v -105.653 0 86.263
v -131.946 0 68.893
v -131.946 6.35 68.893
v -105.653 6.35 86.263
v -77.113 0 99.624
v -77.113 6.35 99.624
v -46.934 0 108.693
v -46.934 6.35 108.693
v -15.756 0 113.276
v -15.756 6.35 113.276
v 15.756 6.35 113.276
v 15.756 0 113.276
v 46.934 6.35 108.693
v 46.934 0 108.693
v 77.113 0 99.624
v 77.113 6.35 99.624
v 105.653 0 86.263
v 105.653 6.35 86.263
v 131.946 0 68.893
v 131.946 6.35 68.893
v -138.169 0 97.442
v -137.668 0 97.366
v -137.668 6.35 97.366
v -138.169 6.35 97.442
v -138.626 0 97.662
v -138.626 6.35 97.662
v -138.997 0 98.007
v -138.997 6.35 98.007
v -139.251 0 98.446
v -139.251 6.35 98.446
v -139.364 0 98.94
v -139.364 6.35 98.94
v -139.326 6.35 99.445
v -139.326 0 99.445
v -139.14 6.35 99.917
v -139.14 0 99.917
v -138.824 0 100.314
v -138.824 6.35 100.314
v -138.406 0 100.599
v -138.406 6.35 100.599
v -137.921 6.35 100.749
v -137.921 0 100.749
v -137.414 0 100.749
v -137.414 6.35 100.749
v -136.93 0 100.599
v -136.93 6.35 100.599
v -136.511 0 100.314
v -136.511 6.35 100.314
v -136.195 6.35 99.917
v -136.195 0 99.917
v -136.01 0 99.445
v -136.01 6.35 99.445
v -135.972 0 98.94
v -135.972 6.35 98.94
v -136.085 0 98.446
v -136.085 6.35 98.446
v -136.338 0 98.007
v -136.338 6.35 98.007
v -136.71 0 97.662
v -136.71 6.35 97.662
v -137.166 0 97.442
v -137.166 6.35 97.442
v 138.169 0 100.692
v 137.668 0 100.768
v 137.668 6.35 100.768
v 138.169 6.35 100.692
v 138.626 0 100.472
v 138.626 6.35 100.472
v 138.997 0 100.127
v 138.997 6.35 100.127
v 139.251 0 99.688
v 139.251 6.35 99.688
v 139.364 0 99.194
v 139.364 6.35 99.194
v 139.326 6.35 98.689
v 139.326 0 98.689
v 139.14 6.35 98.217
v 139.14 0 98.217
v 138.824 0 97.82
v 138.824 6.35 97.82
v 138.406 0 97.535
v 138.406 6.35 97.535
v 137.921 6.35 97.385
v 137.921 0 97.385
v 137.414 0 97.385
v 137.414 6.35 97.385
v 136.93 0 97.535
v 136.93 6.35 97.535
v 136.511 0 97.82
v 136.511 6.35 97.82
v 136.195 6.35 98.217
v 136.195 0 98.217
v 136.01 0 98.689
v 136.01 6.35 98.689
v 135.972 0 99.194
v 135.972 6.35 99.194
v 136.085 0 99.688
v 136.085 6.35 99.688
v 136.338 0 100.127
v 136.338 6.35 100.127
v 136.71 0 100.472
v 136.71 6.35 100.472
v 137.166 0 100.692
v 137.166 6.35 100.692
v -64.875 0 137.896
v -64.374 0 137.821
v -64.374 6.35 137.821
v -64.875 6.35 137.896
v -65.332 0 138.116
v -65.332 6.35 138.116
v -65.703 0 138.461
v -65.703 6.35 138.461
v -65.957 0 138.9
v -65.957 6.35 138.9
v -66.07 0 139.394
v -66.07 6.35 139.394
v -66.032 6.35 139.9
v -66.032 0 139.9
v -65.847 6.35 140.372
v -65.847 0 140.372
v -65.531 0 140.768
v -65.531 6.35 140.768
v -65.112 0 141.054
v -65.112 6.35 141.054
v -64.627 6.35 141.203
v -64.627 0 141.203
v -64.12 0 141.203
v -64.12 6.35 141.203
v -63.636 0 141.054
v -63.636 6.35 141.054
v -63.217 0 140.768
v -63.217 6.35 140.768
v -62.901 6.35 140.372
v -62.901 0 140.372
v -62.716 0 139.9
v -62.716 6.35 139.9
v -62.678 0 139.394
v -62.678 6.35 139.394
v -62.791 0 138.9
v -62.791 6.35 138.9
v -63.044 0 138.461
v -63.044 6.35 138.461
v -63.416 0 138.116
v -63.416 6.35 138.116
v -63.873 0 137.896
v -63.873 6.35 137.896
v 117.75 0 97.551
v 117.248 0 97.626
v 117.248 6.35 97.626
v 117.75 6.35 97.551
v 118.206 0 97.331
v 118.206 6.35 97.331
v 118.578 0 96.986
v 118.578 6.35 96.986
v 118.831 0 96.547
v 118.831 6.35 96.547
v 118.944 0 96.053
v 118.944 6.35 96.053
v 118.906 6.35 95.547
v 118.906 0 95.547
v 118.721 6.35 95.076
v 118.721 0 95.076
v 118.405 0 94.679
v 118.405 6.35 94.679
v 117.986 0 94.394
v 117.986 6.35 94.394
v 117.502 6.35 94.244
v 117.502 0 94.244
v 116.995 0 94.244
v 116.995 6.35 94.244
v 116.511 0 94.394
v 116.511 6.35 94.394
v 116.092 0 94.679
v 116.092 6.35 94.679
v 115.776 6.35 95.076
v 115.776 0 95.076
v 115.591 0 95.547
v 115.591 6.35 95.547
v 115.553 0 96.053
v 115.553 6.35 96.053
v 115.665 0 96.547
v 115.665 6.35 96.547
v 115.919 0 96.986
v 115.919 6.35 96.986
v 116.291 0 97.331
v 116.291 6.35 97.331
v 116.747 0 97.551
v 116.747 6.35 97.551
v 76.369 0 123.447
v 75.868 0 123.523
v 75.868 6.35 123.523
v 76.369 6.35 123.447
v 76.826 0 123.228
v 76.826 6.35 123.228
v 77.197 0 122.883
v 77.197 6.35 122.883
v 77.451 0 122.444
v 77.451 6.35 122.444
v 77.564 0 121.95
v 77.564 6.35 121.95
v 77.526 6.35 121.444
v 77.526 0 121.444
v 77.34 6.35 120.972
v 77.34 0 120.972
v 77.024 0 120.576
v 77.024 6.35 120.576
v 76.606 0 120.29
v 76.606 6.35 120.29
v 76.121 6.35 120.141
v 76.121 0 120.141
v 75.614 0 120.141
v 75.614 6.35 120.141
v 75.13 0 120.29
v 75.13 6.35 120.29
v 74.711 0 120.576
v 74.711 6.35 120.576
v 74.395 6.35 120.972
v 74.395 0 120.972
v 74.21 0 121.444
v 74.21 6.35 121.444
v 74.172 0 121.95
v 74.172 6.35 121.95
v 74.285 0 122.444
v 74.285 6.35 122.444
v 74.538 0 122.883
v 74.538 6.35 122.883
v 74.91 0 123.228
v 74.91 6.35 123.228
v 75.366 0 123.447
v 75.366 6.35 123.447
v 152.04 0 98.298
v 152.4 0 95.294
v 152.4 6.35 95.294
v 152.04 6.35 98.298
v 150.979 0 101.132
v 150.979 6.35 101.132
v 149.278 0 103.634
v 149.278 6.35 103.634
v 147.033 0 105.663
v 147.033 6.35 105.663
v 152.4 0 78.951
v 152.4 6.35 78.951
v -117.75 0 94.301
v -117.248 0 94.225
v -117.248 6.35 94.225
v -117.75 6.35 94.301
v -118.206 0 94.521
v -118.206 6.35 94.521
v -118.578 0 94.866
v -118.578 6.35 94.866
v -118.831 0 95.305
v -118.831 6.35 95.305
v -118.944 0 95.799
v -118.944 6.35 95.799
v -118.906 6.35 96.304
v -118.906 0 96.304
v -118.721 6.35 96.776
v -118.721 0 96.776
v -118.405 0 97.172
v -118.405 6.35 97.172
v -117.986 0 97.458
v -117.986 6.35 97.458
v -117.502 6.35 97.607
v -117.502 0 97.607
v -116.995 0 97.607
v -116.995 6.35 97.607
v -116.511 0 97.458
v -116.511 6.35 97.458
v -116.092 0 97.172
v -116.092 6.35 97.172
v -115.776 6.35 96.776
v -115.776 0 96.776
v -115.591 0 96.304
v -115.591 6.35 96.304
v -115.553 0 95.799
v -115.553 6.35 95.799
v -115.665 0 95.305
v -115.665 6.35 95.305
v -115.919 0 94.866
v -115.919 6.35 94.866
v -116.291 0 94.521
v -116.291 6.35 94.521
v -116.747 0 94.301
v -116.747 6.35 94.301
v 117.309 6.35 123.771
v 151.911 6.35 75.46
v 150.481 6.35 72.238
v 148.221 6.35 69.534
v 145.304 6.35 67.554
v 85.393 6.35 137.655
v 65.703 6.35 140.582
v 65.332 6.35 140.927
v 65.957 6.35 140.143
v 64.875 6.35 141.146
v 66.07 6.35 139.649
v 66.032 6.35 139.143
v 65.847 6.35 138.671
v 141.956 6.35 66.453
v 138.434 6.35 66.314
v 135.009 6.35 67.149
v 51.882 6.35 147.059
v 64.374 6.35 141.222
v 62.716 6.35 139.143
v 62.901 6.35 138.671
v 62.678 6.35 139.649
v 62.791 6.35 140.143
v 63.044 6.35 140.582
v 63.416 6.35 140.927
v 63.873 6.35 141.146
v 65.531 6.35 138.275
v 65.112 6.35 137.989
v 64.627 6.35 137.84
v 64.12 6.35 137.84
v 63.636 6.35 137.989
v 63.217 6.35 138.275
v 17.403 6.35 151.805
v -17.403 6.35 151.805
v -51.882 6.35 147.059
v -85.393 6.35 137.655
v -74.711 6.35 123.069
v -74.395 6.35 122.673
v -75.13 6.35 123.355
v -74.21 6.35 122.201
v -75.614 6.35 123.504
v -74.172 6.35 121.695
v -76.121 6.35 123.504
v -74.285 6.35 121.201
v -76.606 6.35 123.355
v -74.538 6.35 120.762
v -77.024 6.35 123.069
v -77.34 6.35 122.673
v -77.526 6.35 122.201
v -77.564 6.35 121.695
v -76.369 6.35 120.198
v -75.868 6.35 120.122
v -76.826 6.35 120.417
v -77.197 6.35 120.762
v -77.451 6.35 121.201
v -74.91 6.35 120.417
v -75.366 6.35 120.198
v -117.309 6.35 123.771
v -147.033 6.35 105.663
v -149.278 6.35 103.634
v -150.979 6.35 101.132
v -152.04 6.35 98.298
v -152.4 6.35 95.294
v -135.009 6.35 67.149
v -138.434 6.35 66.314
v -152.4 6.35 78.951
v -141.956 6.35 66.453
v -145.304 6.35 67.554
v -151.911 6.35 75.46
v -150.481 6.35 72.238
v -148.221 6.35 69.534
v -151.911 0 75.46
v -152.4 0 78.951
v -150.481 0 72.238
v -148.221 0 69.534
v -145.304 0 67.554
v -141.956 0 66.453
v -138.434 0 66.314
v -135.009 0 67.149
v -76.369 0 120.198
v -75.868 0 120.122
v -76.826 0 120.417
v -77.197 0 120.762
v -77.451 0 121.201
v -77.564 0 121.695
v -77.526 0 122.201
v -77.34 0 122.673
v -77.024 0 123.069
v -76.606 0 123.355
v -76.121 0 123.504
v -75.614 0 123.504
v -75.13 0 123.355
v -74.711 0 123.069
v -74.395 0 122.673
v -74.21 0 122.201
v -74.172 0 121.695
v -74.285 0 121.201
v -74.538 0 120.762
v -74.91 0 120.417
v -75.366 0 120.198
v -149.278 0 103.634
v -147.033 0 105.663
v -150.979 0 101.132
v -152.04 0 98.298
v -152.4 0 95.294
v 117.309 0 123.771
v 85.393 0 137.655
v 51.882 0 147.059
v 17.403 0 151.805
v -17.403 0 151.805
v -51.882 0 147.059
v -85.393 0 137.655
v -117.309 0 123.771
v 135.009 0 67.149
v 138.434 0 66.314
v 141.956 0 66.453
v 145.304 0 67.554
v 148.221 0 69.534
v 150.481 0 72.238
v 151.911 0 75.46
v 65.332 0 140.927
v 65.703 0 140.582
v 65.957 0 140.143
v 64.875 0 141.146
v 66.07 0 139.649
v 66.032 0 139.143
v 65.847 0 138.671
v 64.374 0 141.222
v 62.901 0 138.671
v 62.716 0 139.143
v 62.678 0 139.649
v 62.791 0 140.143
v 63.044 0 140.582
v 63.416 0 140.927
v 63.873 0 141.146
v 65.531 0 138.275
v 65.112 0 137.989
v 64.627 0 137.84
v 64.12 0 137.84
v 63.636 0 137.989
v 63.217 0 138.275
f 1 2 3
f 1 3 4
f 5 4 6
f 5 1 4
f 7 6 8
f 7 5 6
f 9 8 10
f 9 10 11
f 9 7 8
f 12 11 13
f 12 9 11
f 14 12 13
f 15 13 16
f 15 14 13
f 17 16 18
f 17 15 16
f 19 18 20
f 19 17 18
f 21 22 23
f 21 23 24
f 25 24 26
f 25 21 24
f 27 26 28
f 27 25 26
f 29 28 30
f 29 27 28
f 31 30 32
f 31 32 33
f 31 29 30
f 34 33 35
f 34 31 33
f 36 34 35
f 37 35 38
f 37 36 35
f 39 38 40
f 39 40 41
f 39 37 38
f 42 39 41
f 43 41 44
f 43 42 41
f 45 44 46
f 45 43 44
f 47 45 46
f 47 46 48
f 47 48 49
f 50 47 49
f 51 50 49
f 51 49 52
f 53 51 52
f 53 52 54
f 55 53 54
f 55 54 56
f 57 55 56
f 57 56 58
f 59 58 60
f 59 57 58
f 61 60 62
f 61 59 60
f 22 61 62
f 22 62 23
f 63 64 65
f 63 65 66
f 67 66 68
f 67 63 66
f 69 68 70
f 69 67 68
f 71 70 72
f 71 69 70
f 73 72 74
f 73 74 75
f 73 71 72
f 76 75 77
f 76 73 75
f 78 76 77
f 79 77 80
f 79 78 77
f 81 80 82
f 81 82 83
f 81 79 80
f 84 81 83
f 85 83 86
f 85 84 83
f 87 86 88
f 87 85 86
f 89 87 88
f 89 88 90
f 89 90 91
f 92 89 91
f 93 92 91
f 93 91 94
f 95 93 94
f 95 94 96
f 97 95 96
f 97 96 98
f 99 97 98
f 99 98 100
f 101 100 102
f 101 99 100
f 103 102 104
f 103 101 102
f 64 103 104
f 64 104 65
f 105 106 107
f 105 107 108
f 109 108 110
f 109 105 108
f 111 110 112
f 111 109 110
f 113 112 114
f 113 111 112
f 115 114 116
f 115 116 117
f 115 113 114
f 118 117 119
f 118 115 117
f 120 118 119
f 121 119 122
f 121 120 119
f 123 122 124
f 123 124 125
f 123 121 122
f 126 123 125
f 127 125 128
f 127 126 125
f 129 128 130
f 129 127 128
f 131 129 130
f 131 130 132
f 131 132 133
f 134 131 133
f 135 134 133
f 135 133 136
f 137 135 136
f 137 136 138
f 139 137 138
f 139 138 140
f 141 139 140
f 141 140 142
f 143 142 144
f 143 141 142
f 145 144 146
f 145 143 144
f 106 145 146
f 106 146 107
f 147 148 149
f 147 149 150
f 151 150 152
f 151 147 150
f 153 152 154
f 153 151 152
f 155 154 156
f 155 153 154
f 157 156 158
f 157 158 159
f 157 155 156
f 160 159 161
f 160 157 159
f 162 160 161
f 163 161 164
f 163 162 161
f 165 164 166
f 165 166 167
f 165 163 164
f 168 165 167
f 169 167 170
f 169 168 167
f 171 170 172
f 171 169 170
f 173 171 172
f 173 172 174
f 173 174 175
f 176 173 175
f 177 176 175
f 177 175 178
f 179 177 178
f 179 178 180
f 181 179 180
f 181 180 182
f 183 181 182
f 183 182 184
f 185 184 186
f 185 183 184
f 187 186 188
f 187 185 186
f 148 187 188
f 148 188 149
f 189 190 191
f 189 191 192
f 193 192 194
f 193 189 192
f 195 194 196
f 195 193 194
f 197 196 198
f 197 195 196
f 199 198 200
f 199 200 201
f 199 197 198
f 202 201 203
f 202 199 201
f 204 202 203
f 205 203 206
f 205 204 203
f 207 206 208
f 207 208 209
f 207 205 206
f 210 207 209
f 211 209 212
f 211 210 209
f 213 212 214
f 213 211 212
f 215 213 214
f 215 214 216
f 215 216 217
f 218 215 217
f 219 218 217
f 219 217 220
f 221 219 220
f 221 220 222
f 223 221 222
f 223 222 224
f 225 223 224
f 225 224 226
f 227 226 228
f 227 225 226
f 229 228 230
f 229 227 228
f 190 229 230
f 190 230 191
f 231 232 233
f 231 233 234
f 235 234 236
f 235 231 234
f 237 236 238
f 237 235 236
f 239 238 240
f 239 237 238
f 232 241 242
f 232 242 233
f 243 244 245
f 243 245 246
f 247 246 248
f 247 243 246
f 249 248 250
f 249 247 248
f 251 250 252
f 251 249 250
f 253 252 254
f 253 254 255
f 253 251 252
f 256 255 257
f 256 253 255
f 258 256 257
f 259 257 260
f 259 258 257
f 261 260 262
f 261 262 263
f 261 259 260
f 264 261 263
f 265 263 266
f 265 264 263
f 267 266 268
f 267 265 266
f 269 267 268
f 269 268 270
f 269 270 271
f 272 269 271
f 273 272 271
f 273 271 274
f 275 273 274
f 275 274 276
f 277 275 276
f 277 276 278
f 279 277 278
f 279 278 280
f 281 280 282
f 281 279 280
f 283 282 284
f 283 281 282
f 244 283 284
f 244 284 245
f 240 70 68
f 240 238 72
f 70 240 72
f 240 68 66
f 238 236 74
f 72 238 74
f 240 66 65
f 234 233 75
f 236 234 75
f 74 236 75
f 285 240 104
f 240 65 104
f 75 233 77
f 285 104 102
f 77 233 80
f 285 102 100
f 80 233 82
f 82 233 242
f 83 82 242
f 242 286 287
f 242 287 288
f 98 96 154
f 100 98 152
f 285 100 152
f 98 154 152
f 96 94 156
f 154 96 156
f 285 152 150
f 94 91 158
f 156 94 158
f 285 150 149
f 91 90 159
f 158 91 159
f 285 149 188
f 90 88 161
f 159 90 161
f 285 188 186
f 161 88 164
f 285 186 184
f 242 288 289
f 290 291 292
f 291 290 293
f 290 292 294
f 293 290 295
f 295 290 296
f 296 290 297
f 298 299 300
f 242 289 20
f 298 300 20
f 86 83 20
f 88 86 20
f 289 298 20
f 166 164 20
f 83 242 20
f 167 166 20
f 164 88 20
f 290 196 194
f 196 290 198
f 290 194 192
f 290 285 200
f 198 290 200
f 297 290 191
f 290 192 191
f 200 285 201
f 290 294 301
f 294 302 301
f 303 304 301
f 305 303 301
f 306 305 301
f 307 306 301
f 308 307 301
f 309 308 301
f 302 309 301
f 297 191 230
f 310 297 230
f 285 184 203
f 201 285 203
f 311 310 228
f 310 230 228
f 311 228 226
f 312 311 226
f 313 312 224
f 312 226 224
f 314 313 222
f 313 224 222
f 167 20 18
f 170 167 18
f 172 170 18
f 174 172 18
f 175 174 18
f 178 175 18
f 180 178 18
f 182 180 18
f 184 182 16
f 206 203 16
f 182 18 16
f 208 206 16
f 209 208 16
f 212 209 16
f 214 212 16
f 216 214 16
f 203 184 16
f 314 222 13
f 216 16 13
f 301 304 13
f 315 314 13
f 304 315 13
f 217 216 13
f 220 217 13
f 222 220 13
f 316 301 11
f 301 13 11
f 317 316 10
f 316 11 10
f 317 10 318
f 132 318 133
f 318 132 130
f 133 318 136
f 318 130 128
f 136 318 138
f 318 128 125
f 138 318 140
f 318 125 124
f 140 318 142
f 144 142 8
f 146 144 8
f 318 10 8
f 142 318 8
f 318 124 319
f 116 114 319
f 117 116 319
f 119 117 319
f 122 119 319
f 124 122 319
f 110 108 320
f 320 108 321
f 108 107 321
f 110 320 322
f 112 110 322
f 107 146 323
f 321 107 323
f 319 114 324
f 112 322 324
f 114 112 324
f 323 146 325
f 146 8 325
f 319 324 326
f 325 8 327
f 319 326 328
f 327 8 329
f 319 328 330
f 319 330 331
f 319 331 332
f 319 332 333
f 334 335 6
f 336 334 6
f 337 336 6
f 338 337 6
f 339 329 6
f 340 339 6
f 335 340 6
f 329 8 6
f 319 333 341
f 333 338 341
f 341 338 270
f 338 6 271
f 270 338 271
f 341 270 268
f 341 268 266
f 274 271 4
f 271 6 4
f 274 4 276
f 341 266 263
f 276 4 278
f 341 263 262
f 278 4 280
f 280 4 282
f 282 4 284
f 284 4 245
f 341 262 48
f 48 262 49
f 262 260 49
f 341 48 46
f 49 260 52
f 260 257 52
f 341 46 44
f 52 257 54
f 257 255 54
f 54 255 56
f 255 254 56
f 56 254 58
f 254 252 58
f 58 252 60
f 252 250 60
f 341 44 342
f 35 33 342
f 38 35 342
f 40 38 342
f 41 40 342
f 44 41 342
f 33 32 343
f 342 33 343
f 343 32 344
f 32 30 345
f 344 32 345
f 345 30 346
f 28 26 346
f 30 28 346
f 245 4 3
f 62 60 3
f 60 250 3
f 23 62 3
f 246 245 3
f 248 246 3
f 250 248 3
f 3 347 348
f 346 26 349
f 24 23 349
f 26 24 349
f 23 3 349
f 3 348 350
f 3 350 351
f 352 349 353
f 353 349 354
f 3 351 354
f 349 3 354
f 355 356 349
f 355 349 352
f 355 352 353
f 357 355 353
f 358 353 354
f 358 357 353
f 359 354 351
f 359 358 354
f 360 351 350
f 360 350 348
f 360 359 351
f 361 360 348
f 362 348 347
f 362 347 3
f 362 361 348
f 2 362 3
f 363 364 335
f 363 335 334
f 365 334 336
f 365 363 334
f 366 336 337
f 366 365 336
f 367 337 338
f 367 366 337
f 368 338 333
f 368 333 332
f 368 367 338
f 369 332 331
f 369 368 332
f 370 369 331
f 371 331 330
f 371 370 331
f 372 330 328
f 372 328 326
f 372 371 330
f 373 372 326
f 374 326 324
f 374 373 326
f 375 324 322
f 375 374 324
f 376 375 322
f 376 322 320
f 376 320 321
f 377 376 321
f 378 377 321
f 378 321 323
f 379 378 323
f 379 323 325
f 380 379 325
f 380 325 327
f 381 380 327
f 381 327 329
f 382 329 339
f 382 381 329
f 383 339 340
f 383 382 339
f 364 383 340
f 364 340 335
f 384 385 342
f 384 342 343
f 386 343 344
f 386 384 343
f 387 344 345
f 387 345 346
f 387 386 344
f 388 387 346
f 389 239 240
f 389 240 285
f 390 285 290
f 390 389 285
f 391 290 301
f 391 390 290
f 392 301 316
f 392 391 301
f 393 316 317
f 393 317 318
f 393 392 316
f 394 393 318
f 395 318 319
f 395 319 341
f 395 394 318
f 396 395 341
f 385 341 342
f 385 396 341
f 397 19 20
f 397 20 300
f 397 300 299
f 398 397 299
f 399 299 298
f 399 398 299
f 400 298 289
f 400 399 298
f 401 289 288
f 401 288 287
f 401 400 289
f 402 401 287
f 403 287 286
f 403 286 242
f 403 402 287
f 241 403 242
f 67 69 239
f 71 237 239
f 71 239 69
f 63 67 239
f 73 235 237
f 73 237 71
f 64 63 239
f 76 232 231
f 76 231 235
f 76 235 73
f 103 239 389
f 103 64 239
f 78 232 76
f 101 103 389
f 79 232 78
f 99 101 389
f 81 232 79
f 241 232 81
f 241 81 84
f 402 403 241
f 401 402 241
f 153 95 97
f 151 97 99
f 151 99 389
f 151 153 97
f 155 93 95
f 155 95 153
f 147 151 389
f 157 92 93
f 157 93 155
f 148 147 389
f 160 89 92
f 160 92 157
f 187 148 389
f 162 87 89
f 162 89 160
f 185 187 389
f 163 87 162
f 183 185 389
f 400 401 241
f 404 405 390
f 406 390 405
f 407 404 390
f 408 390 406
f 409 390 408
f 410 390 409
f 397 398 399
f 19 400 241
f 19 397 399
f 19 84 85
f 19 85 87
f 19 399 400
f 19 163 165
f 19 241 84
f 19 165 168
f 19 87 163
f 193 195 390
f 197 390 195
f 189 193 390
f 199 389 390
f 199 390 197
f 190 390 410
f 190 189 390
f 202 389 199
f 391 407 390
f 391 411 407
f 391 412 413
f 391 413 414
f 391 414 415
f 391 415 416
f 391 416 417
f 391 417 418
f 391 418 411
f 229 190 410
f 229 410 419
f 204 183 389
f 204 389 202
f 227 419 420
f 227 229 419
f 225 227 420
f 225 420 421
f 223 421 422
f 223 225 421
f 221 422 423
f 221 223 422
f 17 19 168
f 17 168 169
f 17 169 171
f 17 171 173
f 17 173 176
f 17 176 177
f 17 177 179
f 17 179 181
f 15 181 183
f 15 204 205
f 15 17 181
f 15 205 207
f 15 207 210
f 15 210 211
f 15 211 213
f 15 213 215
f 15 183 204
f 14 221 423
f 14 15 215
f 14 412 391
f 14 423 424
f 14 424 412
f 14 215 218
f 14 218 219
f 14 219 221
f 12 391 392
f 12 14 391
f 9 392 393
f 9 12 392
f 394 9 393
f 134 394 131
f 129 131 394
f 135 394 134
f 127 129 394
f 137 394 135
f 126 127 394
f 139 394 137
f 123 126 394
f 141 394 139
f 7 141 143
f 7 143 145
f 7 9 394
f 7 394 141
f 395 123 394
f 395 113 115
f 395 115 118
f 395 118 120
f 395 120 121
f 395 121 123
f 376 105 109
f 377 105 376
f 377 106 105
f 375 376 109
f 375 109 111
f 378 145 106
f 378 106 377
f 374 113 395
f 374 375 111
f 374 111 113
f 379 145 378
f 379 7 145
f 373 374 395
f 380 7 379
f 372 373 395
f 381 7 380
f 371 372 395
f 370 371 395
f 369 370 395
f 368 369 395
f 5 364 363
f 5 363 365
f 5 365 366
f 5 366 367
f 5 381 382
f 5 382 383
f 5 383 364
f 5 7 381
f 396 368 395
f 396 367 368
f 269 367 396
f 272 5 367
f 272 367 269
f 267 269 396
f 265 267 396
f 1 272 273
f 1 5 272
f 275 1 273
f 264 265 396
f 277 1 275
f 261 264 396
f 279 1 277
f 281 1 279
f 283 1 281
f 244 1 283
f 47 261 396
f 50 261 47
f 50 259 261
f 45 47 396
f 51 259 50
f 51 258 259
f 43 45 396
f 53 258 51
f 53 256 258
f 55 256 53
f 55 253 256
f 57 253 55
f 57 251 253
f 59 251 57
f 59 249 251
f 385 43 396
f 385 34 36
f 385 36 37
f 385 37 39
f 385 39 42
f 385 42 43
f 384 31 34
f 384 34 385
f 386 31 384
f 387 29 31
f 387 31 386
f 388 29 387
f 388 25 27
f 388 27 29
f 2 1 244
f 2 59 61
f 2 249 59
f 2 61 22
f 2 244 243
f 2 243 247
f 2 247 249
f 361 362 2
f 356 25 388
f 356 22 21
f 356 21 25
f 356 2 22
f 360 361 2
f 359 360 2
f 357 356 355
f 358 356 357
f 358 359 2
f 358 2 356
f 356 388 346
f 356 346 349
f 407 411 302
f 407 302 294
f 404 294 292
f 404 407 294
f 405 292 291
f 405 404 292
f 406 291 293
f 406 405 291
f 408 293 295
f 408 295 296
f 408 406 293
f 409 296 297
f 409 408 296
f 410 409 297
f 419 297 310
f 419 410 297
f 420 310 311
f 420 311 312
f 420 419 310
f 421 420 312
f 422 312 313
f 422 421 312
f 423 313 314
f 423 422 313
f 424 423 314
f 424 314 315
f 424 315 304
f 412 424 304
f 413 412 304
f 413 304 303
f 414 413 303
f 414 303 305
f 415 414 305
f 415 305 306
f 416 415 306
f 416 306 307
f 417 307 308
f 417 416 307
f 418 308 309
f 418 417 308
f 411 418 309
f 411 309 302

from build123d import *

# Parameters (mm, degrees)
SKETCH1_R           = 1.70053
BOSS_EXTRUDE1_DEPTH = 6.35


with BuildPart() as part:
    # Sketch1 → Boss-Extrude1 (new body)
    with BuildSketch(Plane(origin=(0, 0, 0), x_dir=(1, 0, 0), z_dir=(0, 1, 0))):
        with BuildLine():
            Line((152.4, -78.951070218), (152.4, -95.294257863))
            ThreePointArc((152.4, -95.294257863), (150.97868492, -101.132174142), (147.03287142, -105.663394603))
            ThreePointArc((147.03287142, -105.663394603), (0, -152.4), (-147.03287142, -105.663394603))
            ThreePointArc((-147.03287142, -105.663394603), (-150.97868492, -101.132174142), (-152.4, -95.294257863))
            Line((-152.4, -95.294257863), (-152.4, -78.951070218))
            ThreePointArc((-152.4, -78.951070218), (-145.304042262, -67.554372875), (-131.945714909, -68.893184619))
            ThreePointArc((-131.945714909, -68.893184619), (0, -113.850994317), (131.945714909, -68.893184619))
            ThreePointArc((131.945714909, -68.893184619), (145.304042262, -67.554372875), (152.4, -78.951070218))
        make_face()
        with Locations(Location((117.248460029, -95.925846163, 0), (0, 0, 270))):
            Circle(SKETCH1_R, mode=Mode.SUBTRACT)
        with Locations(Location((137.667738303, -99.066982467, 0), (0, 0, 270))):
            Circle(SKETCH1_R, mode=Mode.SUBTRACT)
        with Locations(Location((75.867733859, -121.822498113, 0), (0, 0, 270))):
            Circle(SKETCH1_R, mode=Mode.SUBTRACT)
        with Locations(Location((64.373888493, -139.521467891, 0), (0, 0, 270))):
            Circle(SKETCH1_R, mode=Mode.SUBTRACT)
        with Locations(Location((-117.248460029, -95.925846163, 0), (0, 0, 90))):
            Circle(SKETCH1_R, mode=Mode.SUBTRACT)
        with Locations(Location((-137.667738303, -99.066982467, 0), (0, 0, 90))):
            Circle(SKETCH1_R, mode=Mode.SUBTRACT)
        with Locations(Location((-64.373888493, -139.521467891, 0), (0, 0, 90))):
            Circle(SKETCH1_R, mode=Mode.SUBTRACT)
        with Locations(Location((-75.867733859, -121.822498113, 0), (0, 0, 90))):
            Circle(SKETCH1_R, mode=Mode.SUBTRACT)
    extrude(amount=BOSS_EXTRUDE1_DEPTH)


solid = part.part
